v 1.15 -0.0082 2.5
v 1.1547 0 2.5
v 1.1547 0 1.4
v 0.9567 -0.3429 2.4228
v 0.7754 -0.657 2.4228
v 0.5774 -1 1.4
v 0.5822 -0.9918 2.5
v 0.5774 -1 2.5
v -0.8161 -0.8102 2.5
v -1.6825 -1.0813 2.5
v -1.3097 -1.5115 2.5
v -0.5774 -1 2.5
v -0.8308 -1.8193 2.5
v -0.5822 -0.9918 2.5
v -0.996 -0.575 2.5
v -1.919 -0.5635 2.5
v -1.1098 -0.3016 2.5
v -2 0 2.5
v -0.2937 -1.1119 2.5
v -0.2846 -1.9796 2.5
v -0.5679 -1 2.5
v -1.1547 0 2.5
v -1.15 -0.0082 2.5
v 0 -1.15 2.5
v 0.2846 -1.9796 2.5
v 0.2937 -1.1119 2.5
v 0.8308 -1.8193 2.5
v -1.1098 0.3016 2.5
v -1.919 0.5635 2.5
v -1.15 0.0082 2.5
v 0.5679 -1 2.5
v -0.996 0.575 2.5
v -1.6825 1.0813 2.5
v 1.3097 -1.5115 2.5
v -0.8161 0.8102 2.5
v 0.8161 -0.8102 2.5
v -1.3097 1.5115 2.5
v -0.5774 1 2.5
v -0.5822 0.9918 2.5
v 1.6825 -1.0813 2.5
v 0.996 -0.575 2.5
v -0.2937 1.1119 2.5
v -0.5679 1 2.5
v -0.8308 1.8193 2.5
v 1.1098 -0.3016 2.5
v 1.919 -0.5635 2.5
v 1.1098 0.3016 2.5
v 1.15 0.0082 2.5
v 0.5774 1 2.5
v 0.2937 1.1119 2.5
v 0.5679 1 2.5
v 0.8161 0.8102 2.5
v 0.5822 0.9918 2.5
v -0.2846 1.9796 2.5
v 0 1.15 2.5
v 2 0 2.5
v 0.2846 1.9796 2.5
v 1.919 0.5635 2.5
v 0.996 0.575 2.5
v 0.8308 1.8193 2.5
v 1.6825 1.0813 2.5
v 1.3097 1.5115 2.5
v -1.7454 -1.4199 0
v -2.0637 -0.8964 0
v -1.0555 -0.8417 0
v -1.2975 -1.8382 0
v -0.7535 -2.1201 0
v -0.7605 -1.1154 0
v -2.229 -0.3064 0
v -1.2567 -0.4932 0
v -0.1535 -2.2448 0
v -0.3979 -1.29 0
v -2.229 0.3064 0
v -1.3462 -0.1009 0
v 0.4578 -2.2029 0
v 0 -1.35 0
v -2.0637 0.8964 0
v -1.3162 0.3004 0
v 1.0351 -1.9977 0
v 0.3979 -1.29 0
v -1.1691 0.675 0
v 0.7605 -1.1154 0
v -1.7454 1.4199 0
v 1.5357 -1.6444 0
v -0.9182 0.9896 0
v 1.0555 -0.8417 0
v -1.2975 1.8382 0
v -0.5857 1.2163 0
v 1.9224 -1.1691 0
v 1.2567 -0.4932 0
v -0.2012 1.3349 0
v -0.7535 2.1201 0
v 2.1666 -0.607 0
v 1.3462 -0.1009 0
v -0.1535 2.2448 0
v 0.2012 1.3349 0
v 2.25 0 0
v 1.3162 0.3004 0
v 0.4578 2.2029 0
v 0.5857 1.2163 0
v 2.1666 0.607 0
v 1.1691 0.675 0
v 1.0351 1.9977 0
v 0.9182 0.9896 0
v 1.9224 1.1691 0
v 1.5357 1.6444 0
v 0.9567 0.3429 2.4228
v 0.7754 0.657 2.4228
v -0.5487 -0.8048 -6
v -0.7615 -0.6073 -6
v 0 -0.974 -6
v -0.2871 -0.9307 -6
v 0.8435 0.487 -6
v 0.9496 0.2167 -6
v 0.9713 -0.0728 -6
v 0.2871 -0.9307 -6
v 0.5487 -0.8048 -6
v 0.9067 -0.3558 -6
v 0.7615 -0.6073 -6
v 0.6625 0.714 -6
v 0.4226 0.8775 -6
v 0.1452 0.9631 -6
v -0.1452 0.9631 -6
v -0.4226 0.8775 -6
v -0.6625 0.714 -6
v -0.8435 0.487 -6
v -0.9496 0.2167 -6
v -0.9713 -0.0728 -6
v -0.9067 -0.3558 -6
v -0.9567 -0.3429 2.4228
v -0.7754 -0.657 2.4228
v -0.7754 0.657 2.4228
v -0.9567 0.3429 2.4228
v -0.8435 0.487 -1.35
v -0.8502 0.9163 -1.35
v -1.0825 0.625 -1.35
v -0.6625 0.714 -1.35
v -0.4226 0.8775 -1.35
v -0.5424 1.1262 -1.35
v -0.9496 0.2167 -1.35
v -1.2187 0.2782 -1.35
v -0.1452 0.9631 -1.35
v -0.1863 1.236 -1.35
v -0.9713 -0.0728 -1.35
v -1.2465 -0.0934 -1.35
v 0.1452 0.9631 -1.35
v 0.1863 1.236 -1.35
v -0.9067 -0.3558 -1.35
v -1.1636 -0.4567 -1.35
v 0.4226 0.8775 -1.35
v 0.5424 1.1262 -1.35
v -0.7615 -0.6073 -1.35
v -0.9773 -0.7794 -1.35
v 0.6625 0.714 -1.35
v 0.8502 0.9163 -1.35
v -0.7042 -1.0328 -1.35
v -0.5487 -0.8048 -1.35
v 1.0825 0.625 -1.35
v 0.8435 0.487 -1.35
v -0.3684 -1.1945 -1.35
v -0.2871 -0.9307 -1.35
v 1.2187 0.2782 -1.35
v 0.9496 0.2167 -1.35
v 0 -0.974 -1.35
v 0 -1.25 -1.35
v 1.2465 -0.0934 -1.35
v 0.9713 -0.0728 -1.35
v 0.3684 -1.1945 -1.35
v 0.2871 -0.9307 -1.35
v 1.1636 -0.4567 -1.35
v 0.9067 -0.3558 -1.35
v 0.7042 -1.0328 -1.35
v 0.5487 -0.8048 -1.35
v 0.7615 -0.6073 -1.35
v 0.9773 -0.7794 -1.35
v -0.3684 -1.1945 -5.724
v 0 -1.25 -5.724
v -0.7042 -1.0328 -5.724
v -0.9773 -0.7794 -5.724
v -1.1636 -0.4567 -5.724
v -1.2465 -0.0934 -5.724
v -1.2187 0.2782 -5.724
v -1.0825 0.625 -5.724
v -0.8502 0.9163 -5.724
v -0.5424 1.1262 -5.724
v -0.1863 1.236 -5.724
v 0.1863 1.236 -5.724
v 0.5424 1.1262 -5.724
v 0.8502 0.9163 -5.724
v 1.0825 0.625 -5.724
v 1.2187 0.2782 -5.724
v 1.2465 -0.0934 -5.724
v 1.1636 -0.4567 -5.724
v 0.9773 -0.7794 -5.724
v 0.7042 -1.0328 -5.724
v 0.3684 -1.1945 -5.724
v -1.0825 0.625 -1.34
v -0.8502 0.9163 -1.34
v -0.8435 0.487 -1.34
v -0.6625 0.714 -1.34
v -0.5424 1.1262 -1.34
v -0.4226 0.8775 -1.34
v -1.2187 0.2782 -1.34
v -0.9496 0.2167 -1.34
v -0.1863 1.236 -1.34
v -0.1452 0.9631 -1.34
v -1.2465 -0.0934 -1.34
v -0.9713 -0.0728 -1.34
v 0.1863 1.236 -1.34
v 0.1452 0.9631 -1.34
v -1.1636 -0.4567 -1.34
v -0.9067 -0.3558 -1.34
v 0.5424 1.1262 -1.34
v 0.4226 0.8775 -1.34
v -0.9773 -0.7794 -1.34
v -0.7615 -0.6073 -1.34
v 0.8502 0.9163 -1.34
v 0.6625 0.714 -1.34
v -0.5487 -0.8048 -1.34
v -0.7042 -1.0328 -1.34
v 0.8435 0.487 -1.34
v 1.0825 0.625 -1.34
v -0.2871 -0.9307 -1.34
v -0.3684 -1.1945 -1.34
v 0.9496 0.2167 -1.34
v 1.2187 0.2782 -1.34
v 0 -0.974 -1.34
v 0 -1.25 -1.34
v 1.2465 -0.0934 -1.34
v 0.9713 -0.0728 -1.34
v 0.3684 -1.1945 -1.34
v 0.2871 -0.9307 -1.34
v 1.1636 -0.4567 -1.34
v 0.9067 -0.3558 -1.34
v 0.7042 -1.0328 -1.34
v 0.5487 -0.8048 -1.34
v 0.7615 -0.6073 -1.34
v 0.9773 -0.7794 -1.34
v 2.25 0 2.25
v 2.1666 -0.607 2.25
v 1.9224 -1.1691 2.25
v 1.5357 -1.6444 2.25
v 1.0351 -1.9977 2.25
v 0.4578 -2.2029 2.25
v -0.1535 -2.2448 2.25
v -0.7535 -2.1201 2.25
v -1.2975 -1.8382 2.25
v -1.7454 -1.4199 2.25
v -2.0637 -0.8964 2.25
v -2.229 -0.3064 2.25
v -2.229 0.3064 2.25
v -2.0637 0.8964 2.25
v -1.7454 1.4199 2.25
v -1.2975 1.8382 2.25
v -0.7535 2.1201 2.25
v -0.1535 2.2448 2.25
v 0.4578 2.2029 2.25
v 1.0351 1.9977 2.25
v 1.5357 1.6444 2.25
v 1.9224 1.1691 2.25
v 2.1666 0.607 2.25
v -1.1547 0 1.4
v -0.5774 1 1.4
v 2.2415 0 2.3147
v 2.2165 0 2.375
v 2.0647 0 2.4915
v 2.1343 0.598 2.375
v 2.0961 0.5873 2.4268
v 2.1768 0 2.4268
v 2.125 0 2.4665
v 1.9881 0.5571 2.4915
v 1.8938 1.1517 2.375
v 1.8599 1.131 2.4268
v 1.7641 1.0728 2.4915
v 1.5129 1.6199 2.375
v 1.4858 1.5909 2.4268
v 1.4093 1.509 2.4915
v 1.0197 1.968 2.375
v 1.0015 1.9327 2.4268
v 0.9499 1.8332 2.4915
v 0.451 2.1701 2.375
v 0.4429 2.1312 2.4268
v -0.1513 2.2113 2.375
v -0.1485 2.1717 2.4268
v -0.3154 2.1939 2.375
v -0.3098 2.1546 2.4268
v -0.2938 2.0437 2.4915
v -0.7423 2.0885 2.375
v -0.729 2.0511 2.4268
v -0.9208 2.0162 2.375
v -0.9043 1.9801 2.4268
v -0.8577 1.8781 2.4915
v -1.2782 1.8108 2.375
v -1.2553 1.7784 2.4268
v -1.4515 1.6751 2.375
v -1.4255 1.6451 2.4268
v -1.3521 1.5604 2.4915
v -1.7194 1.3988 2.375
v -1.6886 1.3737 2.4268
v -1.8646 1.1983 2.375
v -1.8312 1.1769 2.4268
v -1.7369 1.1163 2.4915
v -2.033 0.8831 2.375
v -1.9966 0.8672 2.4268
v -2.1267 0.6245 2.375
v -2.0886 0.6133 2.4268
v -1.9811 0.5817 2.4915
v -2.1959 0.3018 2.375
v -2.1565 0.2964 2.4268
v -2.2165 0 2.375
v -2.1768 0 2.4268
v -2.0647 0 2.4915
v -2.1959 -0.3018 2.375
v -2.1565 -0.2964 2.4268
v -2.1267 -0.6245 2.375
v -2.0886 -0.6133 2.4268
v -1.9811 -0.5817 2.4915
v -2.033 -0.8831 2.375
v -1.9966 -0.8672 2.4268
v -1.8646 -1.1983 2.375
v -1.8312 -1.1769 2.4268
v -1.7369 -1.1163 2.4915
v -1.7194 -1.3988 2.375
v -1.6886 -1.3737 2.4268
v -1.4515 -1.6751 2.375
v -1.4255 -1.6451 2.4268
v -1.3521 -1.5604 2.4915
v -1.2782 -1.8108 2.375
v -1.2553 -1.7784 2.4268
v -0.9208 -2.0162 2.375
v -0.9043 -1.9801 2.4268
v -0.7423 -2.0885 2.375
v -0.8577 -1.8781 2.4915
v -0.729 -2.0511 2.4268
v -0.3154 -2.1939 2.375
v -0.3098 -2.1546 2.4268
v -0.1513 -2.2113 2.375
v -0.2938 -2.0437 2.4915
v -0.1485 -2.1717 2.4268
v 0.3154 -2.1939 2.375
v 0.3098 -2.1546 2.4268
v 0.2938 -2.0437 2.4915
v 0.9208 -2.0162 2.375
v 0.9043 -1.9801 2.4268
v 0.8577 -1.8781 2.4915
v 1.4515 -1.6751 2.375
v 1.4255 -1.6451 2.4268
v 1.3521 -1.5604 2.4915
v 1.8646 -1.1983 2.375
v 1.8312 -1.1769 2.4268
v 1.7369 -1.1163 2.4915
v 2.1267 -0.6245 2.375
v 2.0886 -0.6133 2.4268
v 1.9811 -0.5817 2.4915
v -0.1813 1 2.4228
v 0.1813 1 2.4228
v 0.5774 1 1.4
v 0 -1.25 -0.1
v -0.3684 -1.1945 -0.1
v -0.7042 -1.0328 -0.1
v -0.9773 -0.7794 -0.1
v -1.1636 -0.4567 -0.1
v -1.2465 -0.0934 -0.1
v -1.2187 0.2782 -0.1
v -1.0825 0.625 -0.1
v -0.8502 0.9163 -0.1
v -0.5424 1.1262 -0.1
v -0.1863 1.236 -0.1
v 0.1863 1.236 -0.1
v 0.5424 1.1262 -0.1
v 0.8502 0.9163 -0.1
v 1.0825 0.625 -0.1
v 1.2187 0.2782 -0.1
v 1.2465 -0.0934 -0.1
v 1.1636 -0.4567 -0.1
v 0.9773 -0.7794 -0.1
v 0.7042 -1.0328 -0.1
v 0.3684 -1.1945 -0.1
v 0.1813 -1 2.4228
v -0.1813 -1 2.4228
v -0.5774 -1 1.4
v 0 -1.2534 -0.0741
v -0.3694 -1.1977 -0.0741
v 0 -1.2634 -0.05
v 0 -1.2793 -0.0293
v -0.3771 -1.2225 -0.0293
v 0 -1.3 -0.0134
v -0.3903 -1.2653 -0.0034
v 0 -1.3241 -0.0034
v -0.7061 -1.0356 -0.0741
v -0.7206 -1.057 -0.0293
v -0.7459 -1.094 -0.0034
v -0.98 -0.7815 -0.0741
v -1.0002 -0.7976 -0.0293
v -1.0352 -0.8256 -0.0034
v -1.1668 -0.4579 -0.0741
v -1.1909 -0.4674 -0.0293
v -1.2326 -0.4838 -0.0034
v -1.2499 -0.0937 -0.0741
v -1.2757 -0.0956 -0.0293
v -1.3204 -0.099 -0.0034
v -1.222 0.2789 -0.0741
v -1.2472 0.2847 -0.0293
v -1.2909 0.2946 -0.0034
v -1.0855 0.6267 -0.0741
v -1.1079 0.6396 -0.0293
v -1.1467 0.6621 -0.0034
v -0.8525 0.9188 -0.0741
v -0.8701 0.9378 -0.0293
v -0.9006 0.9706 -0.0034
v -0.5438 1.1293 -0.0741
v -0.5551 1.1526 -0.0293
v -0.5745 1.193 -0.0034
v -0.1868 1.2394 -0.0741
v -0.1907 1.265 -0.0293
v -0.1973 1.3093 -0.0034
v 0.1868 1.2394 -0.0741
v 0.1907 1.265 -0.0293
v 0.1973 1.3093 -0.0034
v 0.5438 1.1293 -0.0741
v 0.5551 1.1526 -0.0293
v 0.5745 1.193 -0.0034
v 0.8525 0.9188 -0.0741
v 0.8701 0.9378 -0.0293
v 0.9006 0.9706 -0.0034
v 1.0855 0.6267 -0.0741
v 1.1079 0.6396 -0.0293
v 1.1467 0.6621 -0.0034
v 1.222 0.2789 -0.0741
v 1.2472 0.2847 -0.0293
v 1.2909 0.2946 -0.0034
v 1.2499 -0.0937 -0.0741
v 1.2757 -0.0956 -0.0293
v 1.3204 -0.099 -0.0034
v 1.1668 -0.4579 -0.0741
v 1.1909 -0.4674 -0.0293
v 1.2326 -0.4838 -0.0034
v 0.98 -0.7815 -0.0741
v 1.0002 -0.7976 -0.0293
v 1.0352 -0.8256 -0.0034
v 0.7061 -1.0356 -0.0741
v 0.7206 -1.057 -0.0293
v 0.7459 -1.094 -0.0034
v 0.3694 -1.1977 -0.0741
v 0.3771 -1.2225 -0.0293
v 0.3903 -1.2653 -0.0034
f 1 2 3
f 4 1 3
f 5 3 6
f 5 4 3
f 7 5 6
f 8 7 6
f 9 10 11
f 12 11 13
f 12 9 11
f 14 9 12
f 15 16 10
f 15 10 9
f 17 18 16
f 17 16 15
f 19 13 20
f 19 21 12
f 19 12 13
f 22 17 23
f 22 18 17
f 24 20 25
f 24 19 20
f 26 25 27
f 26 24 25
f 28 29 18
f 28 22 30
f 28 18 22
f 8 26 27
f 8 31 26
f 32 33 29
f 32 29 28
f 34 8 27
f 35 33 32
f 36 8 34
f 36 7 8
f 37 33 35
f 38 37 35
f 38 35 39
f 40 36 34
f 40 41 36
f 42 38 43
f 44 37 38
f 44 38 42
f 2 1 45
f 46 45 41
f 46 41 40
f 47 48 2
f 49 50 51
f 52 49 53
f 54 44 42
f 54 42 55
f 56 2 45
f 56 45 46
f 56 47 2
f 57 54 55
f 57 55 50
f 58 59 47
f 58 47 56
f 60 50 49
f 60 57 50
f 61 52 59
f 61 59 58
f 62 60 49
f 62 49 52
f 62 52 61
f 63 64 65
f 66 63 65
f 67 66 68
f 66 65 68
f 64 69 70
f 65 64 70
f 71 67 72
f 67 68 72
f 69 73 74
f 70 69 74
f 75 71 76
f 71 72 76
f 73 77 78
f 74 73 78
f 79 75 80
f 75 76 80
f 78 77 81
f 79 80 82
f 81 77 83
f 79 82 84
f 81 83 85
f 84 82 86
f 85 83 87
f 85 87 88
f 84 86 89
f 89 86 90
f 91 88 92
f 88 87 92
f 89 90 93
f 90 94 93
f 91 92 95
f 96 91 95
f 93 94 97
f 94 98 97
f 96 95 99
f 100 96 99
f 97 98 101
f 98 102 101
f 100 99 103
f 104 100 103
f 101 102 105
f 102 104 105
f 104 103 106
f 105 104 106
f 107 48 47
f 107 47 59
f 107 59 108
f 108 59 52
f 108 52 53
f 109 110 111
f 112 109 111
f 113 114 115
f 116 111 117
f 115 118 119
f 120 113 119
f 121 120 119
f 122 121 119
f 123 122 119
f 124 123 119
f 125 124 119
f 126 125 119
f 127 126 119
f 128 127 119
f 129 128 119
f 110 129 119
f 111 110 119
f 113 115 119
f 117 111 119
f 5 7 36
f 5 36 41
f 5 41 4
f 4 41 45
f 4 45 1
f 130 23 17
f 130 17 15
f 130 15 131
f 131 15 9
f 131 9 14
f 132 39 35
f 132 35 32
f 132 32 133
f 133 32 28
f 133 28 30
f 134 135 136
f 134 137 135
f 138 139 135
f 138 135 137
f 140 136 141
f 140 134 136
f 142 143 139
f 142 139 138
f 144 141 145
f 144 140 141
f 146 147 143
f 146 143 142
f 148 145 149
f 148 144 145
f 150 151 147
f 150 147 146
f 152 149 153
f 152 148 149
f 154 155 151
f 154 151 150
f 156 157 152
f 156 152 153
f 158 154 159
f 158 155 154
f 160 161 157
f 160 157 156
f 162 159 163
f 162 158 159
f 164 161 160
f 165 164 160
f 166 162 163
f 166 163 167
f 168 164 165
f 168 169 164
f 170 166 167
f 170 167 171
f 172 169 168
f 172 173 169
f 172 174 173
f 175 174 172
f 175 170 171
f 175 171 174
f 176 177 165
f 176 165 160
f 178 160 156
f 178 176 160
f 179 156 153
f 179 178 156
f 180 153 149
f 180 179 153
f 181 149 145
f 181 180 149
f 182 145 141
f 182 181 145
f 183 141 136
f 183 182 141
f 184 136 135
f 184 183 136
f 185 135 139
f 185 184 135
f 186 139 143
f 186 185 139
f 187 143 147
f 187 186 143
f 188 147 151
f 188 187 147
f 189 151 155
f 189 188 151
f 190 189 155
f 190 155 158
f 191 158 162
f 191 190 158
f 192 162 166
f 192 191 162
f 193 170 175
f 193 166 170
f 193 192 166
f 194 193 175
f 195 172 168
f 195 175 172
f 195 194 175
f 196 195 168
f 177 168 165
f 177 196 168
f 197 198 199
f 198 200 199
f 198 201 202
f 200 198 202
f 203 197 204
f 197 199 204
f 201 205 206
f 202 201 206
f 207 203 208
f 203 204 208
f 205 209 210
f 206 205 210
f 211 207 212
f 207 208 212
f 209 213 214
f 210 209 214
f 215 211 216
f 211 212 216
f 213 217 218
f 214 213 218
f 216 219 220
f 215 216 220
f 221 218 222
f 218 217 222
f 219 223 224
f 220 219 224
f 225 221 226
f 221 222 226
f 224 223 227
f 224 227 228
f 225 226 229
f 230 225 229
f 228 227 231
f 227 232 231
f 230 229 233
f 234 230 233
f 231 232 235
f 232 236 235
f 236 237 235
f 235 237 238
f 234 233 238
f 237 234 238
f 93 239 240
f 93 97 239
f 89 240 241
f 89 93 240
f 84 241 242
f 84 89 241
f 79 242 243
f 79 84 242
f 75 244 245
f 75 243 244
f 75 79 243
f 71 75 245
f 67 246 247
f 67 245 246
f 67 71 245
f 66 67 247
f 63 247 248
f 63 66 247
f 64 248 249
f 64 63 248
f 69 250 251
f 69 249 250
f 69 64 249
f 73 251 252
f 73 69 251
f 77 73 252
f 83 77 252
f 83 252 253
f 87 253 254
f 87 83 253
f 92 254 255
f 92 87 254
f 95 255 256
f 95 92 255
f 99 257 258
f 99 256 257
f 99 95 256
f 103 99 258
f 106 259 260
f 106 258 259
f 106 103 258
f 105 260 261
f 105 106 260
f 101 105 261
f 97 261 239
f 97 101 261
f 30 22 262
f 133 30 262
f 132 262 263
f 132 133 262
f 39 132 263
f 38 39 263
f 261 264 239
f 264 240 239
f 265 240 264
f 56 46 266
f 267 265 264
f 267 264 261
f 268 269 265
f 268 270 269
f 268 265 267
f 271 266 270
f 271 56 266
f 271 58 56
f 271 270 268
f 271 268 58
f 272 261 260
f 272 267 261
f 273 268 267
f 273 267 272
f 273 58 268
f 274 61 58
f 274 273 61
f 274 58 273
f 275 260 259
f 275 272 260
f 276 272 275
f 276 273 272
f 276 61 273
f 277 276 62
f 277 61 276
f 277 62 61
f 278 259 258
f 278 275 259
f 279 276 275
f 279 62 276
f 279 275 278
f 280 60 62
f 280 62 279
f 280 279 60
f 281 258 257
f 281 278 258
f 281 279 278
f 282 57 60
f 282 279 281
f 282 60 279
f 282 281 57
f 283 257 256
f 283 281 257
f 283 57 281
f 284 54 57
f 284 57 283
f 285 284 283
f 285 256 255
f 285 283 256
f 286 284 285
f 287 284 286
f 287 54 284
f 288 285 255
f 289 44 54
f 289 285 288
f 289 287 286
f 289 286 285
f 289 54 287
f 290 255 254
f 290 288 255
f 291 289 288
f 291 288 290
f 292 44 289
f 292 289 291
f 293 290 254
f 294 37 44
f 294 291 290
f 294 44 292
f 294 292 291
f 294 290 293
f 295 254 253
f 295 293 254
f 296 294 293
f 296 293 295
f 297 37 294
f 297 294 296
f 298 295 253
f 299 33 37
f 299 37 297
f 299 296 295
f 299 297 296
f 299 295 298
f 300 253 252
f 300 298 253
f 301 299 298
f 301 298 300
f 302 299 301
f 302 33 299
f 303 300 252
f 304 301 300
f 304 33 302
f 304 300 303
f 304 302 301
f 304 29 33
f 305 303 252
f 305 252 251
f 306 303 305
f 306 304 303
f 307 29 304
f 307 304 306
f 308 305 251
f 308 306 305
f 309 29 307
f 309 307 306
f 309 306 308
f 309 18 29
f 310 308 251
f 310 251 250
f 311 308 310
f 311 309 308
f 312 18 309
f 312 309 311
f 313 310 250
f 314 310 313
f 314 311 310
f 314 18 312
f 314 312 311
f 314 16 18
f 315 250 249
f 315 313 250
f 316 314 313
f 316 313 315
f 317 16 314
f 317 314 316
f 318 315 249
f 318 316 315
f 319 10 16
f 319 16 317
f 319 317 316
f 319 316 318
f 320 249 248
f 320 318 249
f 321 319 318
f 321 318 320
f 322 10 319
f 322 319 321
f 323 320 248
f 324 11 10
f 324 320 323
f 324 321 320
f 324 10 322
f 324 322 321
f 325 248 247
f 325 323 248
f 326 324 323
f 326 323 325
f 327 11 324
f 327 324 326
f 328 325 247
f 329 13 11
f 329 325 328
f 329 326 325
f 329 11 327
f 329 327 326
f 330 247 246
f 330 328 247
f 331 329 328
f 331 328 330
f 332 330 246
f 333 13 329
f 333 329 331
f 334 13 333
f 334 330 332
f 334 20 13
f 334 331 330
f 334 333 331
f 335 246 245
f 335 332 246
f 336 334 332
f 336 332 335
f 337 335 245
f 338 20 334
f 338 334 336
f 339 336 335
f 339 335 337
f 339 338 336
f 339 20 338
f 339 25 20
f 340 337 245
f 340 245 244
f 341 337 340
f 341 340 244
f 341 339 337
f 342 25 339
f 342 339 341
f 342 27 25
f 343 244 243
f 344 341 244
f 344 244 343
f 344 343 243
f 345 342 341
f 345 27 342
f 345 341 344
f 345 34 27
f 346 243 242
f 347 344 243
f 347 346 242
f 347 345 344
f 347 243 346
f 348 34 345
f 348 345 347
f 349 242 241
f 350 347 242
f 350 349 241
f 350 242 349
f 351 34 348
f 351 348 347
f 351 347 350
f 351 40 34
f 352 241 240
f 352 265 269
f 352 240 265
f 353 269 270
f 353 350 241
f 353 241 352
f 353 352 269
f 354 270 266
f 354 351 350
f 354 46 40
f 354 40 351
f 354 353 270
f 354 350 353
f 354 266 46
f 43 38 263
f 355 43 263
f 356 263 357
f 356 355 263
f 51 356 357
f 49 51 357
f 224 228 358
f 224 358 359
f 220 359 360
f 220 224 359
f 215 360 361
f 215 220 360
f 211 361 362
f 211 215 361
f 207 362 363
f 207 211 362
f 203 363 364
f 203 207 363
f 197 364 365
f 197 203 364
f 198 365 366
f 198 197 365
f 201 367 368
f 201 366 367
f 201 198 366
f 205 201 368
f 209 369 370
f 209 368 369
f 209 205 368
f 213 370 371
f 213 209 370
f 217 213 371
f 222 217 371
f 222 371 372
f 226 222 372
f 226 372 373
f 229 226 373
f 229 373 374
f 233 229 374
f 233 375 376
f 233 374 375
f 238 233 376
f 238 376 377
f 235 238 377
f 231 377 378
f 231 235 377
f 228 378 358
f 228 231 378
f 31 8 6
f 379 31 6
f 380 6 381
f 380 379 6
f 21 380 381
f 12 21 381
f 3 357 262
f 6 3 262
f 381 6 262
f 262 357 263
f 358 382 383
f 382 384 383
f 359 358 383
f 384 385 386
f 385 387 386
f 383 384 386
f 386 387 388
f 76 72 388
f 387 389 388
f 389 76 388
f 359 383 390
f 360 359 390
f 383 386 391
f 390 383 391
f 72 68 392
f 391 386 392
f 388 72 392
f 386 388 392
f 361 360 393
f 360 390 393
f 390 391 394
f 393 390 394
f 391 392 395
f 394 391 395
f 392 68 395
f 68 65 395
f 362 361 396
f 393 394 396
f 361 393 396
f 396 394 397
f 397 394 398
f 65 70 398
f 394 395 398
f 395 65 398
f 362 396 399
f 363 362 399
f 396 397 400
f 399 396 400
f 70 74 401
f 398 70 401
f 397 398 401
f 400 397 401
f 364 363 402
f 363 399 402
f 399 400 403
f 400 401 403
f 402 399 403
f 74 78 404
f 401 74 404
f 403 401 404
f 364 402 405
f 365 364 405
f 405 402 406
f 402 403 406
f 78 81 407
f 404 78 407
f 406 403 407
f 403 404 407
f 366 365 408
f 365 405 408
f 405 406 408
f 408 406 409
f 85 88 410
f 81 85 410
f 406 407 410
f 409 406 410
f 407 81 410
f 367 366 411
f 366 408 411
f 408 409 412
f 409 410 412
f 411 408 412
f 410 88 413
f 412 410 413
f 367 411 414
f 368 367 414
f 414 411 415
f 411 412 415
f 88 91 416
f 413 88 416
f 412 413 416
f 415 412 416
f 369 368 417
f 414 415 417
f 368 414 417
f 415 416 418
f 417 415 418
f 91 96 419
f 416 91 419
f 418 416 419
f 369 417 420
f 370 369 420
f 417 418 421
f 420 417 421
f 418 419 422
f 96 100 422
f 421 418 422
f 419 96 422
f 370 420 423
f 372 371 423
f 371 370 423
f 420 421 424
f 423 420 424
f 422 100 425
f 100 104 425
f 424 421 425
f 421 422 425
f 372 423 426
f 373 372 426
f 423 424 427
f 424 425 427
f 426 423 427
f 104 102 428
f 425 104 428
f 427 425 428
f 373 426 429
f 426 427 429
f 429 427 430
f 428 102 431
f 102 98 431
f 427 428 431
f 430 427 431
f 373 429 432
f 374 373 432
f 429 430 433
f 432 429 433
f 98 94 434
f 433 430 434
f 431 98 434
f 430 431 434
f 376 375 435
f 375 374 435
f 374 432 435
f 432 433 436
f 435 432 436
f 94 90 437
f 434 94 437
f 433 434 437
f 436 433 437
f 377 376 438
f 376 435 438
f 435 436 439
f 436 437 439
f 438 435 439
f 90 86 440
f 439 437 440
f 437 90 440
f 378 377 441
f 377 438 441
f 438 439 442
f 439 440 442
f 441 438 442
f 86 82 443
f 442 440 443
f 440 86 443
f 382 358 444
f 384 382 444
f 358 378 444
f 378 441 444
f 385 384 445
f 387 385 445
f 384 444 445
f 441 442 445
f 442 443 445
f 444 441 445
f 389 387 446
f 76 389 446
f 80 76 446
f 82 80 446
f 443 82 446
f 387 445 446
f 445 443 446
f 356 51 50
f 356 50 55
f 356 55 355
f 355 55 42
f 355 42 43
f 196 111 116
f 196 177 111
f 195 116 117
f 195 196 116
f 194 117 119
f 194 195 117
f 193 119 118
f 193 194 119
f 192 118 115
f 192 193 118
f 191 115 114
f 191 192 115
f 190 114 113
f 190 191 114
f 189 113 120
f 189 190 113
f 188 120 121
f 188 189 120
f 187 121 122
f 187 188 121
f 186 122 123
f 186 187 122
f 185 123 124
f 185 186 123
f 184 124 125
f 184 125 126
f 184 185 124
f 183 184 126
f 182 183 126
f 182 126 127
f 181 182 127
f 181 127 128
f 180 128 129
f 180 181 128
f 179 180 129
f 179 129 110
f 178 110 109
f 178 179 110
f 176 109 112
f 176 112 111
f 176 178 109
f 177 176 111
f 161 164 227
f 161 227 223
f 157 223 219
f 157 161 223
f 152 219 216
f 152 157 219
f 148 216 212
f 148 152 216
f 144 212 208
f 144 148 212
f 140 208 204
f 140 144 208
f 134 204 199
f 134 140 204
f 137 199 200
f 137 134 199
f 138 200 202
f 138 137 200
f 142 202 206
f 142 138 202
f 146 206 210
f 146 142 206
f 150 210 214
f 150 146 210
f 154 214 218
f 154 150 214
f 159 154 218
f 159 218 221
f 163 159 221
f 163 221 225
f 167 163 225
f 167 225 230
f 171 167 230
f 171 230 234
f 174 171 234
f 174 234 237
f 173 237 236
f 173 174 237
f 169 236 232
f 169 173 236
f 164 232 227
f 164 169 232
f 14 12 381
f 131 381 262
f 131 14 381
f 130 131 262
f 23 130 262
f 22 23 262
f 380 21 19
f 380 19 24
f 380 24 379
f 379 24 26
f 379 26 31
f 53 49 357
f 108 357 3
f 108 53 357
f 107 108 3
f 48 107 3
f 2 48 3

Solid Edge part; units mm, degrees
sketch "Sketch1" plane through (0, 0, 0) normal (0, 0, 1) x (1, 0, 0)
  circle A0 centre (0, 0) radius 2.25
extrude "Protrusion1" add sketch "Sketch1" along normal blind 2.5
sketch "Sketch2" plane through (0, 0, 2.5) normal (0, 0, 1) x (0, 1, 0)
  line L0 (0, 1.1547) -> (1, 0.5774)
  line L1 (1, 0.5774) -> (1, -0.5774)
  line L2 (1, -0.5774) -> (0, -1.1547)
  line L3 (0, -1.1547) -> (-1, -0.5774)
  line L4 (-1, -0.5774) -> (-1, 0.5774)
  line L5 (-1, 0.5774) -> (0, 1.1547)
extrude "Cutout1" cut sketch "Sketch2" against normal blind 1.1
fillet "Round1" radius 0.25 1 edges at (-2.25, 0, 2.5)
sketch "Sketch3" plane through (0, 0, 0) normal (1, 0, 0) x (0, 1, 0)
  line L0 (-0.974, -6) -> (0, -6)
  line L1 (-1.25, -5.724) -> (-0.974, -6)
  line L2 (-1.25, -1.35) -> (-1.25, -5.724)
  line L3 (-0.974, -1.35) -> (-1.25, -1.35)
  line L4 (-0.974, -1.34) -> (-0.974, -1.35)
  line L5 (-1.25, -1.34) -> (-0.974, -1.34)
  line L6 (-1.25, -0.1) -> (-1.25, -1.34)
  arc A0 (-1.25, -0.1) -> (-1.35, 0) centre (-1.35, -0.1) ccw
  dimension "D1" = 1.35
  dimension "D2" = 0.01
  dimension "D3" = 0.1
  dimension "D4" = 6
revolve "RevolvedProtrusion1" add sketch "Sketch3" angle 360 about axis through (0, 0, -60.325) along (0, 0, 1) material side at (0, -0.487, -5.95)
cosmetic_thread "Thread1" size "M2.5"
sketch "Sketch4" plane through (0, 0, 0) normal (0, -1, 0) x (1, 0, 0)
  line L0 (-1.15, 2.5) -> (0, 1.836)
revolve "RevolvedCutout1" cut sketch "Sketch4" angle 360 about axis through (0, 0, 57.15) along (0, 0, -1) material side at (-0.55, 0, 2.2113)
properties material "Stahl"
